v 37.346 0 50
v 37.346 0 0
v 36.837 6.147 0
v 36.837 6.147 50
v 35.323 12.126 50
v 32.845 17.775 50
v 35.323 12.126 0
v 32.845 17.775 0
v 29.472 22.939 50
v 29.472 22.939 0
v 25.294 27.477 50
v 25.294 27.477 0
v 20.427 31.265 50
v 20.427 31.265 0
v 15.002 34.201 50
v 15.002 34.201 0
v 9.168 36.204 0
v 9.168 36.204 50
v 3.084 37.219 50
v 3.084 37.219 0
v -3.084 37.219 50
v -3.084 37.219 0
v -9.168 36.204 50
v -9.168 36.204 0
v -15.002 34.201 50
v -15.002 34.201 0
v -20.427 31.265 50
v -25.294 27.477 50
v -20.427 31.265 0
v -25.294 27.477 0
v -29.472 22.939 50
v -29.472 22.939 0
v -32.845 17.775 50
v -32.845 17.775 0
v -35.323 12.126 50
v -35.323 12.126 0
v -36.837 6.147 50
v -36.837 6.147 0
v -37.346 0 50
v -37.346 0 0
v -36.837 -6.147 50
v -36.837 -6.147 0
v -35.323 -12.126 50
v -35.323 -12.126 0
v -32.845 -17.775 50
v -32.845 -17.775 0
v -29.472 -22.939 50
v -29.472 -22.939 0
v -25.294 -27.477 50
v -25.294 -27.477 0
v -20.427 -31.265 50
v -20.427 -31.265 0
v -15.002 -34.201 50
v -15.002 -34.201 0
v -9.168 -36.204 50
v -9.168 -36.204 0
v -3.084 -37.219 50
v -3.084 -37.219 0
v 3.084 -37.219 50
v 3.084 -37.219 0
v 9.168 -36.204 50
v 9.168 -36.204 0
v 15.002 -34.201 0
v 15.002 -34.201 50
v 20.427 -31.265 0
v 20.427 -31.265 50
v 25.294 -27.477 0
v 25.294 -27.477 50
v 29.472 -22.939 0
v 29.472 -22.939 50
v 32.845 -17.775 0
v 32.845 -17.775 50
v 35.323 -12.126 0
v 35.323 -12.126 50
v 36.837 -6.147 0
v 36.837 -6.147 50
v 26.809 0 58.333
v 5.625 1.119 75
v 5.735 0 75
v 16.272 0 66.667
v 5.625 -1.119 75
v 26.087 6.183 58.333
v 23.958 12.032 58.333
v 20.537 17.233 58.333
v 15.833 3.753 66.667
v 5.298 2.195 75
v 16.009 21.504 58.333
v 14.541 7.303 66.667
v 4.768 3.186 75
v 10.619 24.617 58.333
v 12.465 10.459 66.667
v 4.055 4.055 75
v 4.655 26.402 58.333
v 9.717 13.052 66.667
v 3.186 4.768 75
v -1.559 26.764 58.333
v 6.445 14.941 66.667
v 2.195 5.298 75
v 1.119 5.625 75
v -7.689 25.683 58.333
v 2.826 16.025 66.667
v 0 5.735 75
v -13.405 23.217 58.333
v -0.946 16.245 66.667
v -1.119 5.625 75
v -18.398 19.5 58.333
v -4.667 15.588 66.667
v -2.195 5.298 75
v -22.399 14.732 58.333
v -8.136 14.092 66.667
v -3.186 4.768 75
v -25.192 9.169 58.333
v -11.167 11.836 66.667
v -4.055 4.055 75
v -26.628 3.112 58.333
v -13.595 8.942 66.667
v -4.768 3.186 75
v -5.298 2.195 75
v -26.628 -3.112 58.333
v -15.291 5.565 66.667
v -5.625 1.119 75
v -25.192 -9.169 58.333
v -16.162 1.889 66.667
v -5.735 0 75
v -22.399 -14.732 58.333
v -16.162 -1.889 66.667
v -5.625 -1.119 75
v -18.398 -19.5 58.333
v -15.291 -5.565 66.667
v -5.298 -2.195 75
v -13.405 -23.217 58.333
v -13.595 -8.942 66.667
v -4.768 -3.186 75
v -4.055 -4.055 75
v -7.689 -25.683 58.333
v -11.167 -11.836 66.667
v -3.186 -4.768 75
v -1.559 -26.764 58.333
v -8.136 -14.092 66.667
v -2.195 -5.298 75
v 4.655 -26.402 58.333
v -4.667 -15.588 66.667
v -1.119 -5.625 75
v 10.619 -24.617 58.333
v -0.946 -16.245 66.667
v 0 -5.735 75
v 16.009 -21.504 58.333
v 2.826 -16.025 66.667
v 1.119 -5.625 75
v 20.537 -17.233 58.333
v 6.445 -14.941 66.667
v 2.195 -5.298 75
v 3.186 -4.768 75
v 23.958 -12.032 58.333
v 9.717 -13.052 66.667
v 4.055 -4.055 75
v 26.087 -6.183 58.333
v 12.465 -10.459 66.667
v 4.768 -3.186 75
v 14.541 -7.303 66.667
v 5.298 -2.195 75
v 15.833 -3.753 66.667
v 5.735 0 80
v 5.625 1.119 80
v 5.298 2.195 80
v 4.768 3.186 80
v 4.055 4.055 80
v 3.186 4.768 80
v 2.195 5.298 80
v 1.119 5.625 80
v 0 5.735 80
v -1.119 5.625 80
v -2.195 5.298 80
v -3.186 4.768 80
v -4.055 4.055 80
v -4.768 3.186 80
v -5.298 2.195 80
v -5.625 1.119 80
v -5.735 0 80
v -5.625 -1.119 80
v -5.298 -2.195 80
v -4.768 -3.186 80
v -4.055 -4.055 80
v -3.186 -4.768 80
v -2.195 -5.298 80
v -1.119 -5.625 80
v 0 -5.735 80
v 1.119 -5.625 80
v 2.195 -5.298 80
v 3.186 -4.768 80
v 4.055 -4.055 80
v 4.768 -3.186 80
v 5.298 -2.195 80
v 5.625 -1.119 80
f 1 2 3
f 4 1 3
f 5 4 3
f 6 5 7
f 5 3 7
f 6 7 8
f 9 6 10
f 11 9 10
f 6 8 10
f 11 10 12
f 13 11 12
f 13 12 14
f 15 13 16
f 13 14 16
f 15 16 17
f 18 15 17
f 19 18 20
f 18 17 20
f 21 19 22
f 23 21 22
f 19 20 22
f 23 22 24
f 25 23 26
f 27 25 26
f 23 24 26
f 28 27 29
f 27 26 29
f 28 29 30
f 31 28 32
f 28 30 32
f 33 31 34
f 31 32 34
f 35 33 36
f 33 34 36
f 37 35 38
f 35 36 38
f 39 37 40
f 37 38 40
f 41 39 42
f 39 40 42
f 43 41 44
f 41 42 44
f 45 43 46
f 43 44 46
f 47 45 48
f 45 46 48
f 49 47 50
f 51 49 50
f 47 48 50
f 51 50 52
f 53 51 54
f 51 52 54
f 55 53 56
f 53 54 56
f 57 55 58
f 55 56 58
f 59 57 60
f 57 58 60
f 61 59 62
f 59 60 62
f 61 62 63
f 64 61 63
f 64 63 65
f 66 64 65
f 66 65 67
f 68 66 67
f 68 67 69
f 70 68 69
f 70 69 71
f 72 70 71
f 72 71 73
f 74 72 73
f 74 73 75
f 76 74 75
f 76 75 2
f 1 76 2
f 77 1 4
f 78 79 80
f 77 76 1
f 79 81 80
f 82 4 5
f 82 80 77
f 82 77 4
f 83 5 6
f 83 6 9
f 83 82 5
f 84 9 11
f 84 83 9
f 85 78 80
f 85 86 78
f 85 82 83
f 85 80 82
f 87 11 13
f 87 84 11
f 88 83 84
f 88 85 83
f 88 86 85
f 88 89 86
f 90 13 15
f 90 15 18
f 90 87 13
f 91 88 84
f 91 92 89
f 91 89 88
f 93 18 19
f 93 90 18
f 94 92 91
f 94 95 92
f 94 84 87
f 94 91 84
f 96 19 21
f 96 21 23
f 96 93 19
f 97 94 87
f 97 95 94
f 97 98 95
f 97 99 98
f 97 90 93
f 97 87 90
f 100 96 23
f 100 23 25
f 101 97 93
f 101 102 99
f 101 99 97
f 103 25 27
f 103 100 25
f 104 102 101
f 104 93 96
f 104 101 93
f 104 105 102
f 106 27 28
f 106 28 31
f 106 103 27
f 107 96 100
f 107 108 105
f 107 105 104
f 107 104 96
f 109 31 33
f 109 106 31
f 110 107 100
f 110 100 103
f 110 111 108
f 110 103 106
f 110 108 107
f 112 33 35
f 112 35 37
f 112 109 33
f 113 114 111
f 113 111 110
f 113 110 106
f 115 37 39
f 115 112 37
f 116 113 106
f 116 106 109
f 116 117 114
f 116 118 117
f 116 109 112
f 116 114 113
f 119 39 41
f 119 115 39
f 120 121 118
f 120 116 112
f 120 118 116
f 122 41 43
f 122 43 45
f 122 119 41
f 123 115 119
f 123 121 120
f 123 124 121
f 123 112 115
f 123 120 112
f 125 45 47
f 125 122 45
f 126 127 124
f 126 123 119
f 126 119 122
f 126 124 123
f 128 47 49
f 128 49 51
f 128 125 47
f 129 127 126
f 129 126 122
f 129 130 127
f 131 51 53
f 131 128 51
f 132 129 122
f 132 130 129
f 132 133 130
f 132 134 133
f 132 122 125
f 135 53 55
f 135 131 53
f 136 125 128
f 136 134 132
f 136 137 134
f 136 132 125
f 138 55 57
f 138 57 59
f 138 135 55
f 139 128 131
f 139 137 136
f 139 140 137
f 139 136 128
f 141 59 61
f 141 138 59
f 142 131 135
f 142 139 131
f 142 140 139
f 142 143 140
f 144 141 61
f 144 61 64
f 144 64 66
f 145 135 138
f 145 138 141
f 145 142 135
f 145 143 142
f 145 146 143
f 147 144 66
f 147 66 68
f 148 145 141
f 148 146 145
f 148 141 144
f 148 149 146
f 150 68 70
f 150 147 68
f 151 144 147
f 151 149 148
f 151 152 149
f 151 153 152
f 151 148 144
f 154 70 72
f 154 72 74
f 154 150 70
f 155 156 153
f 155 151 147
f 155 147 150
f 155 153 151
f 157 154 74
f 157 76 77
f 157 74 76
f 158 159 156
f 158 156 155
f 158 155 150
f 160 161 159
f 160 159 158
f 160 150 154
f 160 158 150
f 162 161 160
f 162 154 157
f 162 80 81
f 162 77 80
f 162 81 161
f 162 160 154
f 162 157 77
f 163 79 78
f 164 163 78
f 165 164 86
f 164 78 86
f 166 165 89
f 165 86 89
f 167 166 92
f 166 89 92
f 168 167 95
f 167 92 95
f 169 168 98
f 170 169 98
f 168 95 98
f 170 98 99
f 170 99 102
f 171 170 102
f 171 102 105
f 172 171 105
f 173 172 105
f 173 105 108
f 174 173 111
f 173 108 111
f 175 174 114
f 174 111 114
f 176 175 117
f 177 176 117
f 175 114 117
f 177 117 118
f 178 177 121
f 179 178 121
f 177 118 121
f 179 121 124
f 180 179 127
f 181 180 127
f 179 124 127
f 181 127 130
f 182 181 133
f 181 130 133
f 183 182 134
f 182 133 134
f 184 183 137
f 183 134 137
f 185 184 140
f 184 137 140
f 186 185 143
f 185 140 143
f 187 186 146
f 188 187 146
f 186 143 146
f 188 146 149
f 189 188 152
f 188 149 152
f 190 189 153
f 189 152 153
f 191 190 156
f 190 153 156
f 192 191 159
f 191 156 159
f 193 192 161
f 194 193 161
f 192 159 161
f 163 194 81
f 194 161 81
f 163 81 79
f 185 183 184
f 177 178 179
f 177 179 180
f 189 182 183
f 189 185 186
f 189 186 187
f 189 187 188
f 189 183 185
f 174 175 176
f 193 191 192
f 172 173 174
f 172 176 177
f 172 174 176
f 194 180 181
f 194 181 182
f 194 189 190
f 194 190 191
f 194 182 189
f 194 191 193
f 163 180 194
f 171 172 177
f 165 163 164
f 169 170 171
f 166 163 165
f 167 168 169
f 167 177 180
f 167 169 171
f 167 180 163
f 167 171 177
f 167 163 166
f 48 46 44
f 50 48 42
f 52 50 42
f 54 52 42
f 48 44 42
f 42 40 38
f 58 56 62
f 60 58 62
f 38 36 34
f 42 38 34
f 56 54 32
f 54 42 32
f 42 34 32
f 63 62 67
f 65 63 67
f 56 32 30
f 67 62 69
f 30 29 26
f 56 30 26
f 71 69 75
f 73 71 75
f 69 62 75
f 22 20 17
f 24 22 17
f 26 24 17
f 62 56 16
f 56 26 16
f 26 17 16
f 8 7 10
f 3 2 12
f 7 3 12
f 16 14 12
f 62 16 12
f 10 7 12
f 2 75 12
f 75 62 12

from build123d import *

# Parameters (mm, degrees)
F0_R      = 37.3463953666
F1_DEPTH  = 50
F1_FACE_R = 37.3463953666
F3_R      = 5.7348766561
F5_DEPTH  = 5


with BuildPart() as f1:
    # F0 (on Top) → F1 (new body)
    with BuildSketch(Plane.XY):
        Circle(F0_R)
    extrude(amount=F1_DEPTH)

    # F1_face (on face) → F4 section 0
    with BuildSketch(Plane.XY.offset(50)):
        Circle(F1_FACE_R)
    # F3 (on offset) → F4 section 1
    with BuildSketch(Plane.XY.offset(75)):
        Circle(F3_R)
    loft()

    # F5 (add): a face of the model
    f5_faces = [f1.faces().sort_by_distance(p)[0] for p in [
        (0, 0, 75),
    ]]
    extrude(f5_faces, amount=F5_DEPTH)


solid = f1.part
